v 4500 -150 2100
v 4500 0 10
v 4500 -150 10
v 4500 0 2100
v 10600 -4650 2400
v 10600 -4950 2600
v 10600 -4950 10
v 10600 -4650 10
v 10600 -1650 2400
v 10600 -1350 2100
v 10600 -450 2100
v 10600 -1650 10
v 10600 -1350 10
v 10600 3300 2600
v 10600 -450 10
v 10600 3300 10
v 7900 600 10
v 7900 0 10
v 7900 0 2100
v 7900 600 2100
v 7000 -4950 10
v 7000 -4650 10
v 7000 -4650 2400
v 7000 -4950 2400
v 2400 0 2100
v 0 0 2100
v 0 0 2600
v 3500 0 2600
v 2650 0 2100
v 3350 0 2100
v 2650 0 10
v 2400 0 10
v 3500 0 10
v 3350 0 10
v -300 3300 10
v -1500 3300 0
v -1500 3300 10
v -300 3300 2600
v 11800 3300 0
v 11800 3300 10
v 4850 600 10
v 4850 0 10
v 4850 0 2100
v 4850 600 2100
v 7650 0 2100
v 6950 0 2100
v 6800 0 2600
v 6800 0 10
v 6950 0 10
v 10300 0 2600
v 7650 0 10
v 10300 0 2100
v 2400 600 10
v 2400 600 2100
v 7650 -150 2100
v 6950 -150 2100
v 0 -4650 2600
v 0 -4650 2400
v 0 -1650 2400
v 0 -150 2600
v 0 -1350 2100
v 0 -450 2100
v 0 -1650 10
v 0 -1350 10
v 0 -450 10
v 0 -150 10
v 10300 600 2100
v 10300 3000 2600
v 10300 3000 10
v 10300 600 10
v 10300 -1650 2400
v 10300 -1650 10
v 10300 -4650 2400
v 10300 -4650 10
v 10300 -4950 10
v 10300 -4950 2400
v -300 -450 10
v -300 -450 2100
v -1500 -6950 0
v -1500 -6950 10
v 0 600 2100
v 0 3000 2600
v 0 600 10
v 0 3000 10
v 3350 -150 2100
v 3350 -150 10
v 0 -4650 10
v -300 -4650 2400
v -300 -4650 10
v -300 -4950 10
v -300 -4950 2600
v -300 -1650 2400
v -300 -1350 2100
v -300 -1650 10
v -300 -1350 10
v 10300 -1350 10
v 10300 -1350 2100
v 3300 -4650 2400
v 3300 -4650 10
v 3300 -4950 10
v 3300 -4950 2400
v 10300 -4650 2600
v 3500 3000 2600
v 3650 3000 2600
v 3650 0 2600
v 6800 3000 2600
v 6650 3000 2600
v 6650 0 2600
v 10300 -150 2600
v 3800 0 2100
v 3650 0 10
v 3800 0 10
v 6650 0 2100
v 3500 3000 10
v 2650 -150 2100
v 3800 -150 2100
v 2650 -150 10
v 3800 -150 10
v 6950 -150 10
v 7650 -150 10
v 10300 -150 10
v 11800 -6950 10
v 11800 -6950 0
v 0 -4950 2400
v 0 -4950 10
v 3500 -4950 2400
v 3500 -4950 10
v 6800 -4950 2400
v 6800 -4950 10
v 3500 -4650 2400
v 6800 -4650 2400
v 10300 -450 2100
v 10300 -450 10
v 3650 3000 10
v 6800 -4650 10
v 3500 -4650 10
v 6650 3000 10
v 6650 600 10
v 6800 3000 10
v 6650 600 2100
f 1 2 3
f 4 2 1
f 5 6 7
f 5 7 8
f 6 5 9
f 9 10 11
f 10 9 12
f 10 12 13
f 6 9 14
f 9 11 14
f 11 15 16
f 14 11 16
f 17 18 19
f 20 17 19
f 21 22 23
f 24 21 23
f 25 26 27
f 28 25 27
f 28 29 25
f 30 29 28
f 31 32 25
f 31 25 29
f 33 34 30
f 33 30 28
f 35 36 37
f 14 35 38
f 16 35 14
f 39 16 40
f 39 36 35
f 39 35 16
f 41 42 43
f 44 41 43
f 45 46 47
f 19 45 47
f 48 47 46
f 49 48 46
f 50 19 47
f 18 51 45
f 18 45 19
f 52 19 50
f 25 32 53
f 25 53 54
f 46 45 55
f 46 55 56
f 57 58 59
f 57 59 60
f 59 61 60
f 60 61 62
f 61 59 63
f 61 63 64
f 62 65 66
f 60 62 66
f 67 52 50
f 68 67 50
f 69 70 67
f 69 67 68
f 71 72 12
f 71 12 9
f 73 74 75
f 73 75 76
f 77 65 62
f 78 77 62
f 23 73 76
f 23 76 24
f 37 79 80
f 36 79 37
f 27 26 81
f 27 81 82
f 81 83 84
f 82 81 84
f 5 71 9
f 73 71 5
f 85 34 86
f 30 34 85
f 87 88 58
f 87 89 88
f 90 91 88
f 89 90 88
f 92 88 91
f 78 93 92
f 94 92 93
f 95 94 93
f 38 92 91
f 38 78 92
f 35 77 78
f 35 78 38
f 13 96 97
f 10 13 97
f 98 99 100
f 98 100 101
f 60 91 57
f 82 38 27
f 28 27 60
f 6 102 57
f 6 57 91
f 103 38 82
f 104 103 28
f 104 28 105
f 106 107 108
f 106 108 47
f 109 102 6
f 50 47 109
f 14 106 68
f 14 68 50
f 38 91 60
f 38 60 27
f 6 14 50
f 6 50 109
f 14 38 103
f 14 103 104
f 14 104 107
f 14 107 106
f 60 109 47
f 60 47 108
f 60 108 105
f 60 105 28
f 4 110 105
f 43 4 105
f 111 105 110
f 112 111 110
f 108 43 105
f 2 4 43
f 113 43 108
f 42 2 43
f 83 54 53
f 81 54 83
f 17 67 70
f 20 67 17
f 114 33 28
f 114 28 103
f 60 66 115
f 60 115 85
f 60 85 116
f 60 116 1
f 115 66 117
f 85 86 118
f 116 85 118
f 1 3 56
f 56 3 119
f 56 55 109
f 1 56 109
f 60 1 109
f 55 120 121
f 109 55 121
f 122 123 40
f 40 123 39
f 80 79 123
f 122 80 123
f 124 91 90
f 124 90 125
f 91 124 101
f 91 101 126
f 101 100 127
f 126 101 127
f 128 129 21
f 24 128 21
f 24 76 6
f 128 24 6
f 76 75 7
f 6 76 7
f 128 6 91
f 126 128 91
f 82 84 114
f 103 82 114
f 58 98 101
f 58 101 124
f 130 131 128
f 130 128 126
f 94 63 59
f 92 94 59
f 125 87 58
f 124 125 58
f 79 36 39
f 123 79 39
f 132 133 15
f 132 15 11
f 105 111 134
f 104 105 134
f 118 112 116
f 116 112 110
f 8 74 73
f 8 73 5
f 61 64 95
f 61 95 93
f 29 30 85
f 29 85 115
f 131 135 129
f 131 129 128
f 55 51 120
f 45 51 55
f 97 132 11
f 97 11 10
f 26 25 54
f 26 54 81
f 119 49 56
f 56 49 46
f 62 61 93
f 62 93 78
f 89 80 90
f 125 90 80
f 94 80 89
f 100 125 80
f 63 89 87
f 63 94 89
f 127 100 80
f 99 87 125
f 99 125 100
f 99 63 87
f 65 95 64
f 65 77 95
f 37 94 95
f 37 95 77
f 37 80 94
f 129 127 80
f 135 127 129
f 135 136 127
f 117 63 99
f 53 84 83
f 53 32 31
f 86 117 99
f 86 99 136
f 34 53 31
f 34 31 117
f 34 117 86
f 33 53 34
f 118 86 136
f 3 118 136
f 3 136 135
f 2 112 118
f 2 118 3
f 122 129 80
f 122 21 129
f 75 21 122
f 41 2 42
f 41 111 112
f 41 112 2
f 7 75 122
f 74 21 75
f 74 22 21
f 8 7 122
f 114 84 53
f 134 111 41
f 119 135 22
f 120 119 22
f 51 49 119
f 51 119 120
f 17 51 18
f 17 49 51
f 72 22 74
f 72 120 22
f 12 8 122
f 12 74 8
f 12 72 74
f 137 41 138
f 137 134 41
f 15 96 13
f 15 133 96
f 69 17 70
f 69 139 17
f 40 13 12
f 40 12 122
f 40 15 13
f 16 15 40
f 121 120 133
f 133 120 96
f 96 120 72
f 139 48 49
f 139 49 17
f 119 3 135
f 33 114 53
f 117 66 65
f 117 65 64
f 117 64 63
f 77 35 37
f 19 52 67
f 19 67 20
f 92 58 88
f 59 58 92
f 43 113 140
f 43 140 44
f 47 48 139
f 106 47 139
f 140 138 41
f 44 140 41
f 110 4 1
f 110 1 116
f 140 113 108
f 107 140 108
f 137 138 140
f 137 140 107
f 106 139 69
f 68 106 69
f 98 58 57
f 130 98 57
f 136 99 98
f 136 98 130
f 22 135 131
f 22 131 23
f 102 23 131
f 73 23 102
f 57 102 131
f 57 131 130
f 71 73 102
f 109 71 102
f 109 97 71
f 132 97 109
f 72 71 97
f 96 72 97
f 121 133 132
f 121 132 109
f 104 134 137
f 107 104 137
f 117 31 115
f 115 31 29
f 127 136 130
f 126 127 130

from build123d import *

# Parameters (mm, degrees)
F0_W      = 10900
F0_H      = 8250
F0_W_2    = 10300
F0_H_2    = 4500
F0_W_3    = 3500
F0_H_3    = 3000
F0_W_4    = 3000
F1_DEPTH  = 2600
F2_W      = 700
F2_H      = 2100
F3_DEPTH  = 150
F4_W      = 2400
F4_H      = 2100
F4_W_2    = 1800
F5_DEPTH  = 600
F6_W      = 900
F6_H      = 2100
F7_DEPTH  = 300
F8_W      = 900
F8_H      = 2100
F9_DEPTH  = 300
F11_W     = 3000
F11_H     = 2400
F12_DEPTH = 300
F10_W     = 3000
F10_H     = 2400
F13_DEPTH = 300
F14_W     = 3300
F14_H     = 2400
F15_DEPTH = 300
F16_W     = 13300
F16_H     = 10250
F17_DEPTH = 10


with BuildPart() as f1:
    # F0 (on Top) → F1 (new body)
    with BuildSketch(Plane.XY):
        with Locations((5150, -825)):
            Rectangle(F0_W, F0_H)
        with Locations((5150, -2400)):
            Rectangle(F0_W_2, F0_H_2, mode=Mode.SUBTRACT)
        with Locations((1750, 1500)):
            Rectangle(F0_W_3, F0_H_3, mode=Mode.SUBTRACT)
        with Locations((5150, 1500)):
            Rectangle(F0_W_4, F0_H_3, mode=Mode.SUBTRACT)
        with Locations((8550, 1500)):
            Rectangle(F0_W_3, F0_H_3, mode=Mode.SUBTRACT)
    extrude(amount=F1_DEPTH)

    # F2 (on face) → F3 (cut, through all)
    with BuildSketch(Plane(origin=(0, 0, 0), x_dir=(-1, 0, 0), z_dir=(0, 1, 0))):
        with Locations((-4150, 1050)):
            Rectangle(F2_W, F2_H)
        with Locations((-7300, 1050)):
            Rectangle(F2_W, F2_H)
        with Locations((-3000, 1050)):
            Rectangle(F2_W, F2_H)
    extrude(amount=-F3_DEPTH, mode=Mode.SUBTRACT)

    # F4 (on face) → F5 (join)
    with BuildSketch(Plane(origin=(0, 0, 0), x_dir=(-1, 0, 0), z_dir=(0, 1, 0))):
        with Locations((-9100, 1050)):
            Rectangle(F4_W, F4_H)
        with Locations((-5750, 1050)):
            Rectangle(F4_W_2, F4_H)
        with Locations((-1200, 1050)):
            Rectangle(F4_W, F4_H)
    extrude(amount=F5_DEPTH)

    # F6 (on face) → F7 (cut, through all)
    with BuildSketch(Plane(origin=(10300, 0, 0), x_dir=(0, -1, 0), z_dir=(-1, 0, 0))):
        with Locations((900, 1050)):
            Rectangle(F6_W, F6_H)
    extrude(amount=-F7_DEPTH, mode=Mode.SUBTRACT)

    # F8 (on face) → F9 (cut, through all)
    with BuildSketch(Plane.YZ):
        with Locations((-900, 1050)):
            Rectangle(F8_W, F8_H)
    extrude(amount=-F9_DEPTH, mode=Mode.SUBTRACT)

    # F11 (on face) → F12 (cut, through all)
    with BuildSketch(Plane.YZ):
        with Locations((-3150, 1200)):
            Rectangle(F11_W, F11_H)
    extrude(amount=-F12_DEPTH, mode=Mode.SUBTRACT)

    # F10 (on face) → F13 (cut, through all)
    with BuildSketch(Plane(origin=(10300, 0, 0), x_dir=(0, -1, 0), z_dir=(-1, 0, 0))):
        with Locations((3150, 1200)):
            Rectangle(F10_W, F10_H)
    extrude(amount=-F13_DEPTH, mode=Mode.SUBTRACT)

    # F14 (on face) → F15 (cut, through all)
    with BuildSketch(Plane(origin=(0, -4650, 0), x_dir=(-1, 0, 0), z_dir=(0, 1, 0))):
        with Locations((-8650, 1200)):
            Rectangle(F14_W, F14_H)
        with Locations((-5150, 1200)):
            Rectangle(F14_W, F14_H)
        with Locations((-1650, 1200)):
            Rectangle(F14_W, F14_H)
    extrude(amount=-F15_DEPTH, mode=Mode.SUBTRACT)

    # F16 (on Top) → F17 (join)
    with BuildSketch(Plane.XY):
        with Locations((5150, -1825)):
            Rectangle(F16_W, F16_H)
    extrude(amount=F17_DEPTH)


solid = f1.part
